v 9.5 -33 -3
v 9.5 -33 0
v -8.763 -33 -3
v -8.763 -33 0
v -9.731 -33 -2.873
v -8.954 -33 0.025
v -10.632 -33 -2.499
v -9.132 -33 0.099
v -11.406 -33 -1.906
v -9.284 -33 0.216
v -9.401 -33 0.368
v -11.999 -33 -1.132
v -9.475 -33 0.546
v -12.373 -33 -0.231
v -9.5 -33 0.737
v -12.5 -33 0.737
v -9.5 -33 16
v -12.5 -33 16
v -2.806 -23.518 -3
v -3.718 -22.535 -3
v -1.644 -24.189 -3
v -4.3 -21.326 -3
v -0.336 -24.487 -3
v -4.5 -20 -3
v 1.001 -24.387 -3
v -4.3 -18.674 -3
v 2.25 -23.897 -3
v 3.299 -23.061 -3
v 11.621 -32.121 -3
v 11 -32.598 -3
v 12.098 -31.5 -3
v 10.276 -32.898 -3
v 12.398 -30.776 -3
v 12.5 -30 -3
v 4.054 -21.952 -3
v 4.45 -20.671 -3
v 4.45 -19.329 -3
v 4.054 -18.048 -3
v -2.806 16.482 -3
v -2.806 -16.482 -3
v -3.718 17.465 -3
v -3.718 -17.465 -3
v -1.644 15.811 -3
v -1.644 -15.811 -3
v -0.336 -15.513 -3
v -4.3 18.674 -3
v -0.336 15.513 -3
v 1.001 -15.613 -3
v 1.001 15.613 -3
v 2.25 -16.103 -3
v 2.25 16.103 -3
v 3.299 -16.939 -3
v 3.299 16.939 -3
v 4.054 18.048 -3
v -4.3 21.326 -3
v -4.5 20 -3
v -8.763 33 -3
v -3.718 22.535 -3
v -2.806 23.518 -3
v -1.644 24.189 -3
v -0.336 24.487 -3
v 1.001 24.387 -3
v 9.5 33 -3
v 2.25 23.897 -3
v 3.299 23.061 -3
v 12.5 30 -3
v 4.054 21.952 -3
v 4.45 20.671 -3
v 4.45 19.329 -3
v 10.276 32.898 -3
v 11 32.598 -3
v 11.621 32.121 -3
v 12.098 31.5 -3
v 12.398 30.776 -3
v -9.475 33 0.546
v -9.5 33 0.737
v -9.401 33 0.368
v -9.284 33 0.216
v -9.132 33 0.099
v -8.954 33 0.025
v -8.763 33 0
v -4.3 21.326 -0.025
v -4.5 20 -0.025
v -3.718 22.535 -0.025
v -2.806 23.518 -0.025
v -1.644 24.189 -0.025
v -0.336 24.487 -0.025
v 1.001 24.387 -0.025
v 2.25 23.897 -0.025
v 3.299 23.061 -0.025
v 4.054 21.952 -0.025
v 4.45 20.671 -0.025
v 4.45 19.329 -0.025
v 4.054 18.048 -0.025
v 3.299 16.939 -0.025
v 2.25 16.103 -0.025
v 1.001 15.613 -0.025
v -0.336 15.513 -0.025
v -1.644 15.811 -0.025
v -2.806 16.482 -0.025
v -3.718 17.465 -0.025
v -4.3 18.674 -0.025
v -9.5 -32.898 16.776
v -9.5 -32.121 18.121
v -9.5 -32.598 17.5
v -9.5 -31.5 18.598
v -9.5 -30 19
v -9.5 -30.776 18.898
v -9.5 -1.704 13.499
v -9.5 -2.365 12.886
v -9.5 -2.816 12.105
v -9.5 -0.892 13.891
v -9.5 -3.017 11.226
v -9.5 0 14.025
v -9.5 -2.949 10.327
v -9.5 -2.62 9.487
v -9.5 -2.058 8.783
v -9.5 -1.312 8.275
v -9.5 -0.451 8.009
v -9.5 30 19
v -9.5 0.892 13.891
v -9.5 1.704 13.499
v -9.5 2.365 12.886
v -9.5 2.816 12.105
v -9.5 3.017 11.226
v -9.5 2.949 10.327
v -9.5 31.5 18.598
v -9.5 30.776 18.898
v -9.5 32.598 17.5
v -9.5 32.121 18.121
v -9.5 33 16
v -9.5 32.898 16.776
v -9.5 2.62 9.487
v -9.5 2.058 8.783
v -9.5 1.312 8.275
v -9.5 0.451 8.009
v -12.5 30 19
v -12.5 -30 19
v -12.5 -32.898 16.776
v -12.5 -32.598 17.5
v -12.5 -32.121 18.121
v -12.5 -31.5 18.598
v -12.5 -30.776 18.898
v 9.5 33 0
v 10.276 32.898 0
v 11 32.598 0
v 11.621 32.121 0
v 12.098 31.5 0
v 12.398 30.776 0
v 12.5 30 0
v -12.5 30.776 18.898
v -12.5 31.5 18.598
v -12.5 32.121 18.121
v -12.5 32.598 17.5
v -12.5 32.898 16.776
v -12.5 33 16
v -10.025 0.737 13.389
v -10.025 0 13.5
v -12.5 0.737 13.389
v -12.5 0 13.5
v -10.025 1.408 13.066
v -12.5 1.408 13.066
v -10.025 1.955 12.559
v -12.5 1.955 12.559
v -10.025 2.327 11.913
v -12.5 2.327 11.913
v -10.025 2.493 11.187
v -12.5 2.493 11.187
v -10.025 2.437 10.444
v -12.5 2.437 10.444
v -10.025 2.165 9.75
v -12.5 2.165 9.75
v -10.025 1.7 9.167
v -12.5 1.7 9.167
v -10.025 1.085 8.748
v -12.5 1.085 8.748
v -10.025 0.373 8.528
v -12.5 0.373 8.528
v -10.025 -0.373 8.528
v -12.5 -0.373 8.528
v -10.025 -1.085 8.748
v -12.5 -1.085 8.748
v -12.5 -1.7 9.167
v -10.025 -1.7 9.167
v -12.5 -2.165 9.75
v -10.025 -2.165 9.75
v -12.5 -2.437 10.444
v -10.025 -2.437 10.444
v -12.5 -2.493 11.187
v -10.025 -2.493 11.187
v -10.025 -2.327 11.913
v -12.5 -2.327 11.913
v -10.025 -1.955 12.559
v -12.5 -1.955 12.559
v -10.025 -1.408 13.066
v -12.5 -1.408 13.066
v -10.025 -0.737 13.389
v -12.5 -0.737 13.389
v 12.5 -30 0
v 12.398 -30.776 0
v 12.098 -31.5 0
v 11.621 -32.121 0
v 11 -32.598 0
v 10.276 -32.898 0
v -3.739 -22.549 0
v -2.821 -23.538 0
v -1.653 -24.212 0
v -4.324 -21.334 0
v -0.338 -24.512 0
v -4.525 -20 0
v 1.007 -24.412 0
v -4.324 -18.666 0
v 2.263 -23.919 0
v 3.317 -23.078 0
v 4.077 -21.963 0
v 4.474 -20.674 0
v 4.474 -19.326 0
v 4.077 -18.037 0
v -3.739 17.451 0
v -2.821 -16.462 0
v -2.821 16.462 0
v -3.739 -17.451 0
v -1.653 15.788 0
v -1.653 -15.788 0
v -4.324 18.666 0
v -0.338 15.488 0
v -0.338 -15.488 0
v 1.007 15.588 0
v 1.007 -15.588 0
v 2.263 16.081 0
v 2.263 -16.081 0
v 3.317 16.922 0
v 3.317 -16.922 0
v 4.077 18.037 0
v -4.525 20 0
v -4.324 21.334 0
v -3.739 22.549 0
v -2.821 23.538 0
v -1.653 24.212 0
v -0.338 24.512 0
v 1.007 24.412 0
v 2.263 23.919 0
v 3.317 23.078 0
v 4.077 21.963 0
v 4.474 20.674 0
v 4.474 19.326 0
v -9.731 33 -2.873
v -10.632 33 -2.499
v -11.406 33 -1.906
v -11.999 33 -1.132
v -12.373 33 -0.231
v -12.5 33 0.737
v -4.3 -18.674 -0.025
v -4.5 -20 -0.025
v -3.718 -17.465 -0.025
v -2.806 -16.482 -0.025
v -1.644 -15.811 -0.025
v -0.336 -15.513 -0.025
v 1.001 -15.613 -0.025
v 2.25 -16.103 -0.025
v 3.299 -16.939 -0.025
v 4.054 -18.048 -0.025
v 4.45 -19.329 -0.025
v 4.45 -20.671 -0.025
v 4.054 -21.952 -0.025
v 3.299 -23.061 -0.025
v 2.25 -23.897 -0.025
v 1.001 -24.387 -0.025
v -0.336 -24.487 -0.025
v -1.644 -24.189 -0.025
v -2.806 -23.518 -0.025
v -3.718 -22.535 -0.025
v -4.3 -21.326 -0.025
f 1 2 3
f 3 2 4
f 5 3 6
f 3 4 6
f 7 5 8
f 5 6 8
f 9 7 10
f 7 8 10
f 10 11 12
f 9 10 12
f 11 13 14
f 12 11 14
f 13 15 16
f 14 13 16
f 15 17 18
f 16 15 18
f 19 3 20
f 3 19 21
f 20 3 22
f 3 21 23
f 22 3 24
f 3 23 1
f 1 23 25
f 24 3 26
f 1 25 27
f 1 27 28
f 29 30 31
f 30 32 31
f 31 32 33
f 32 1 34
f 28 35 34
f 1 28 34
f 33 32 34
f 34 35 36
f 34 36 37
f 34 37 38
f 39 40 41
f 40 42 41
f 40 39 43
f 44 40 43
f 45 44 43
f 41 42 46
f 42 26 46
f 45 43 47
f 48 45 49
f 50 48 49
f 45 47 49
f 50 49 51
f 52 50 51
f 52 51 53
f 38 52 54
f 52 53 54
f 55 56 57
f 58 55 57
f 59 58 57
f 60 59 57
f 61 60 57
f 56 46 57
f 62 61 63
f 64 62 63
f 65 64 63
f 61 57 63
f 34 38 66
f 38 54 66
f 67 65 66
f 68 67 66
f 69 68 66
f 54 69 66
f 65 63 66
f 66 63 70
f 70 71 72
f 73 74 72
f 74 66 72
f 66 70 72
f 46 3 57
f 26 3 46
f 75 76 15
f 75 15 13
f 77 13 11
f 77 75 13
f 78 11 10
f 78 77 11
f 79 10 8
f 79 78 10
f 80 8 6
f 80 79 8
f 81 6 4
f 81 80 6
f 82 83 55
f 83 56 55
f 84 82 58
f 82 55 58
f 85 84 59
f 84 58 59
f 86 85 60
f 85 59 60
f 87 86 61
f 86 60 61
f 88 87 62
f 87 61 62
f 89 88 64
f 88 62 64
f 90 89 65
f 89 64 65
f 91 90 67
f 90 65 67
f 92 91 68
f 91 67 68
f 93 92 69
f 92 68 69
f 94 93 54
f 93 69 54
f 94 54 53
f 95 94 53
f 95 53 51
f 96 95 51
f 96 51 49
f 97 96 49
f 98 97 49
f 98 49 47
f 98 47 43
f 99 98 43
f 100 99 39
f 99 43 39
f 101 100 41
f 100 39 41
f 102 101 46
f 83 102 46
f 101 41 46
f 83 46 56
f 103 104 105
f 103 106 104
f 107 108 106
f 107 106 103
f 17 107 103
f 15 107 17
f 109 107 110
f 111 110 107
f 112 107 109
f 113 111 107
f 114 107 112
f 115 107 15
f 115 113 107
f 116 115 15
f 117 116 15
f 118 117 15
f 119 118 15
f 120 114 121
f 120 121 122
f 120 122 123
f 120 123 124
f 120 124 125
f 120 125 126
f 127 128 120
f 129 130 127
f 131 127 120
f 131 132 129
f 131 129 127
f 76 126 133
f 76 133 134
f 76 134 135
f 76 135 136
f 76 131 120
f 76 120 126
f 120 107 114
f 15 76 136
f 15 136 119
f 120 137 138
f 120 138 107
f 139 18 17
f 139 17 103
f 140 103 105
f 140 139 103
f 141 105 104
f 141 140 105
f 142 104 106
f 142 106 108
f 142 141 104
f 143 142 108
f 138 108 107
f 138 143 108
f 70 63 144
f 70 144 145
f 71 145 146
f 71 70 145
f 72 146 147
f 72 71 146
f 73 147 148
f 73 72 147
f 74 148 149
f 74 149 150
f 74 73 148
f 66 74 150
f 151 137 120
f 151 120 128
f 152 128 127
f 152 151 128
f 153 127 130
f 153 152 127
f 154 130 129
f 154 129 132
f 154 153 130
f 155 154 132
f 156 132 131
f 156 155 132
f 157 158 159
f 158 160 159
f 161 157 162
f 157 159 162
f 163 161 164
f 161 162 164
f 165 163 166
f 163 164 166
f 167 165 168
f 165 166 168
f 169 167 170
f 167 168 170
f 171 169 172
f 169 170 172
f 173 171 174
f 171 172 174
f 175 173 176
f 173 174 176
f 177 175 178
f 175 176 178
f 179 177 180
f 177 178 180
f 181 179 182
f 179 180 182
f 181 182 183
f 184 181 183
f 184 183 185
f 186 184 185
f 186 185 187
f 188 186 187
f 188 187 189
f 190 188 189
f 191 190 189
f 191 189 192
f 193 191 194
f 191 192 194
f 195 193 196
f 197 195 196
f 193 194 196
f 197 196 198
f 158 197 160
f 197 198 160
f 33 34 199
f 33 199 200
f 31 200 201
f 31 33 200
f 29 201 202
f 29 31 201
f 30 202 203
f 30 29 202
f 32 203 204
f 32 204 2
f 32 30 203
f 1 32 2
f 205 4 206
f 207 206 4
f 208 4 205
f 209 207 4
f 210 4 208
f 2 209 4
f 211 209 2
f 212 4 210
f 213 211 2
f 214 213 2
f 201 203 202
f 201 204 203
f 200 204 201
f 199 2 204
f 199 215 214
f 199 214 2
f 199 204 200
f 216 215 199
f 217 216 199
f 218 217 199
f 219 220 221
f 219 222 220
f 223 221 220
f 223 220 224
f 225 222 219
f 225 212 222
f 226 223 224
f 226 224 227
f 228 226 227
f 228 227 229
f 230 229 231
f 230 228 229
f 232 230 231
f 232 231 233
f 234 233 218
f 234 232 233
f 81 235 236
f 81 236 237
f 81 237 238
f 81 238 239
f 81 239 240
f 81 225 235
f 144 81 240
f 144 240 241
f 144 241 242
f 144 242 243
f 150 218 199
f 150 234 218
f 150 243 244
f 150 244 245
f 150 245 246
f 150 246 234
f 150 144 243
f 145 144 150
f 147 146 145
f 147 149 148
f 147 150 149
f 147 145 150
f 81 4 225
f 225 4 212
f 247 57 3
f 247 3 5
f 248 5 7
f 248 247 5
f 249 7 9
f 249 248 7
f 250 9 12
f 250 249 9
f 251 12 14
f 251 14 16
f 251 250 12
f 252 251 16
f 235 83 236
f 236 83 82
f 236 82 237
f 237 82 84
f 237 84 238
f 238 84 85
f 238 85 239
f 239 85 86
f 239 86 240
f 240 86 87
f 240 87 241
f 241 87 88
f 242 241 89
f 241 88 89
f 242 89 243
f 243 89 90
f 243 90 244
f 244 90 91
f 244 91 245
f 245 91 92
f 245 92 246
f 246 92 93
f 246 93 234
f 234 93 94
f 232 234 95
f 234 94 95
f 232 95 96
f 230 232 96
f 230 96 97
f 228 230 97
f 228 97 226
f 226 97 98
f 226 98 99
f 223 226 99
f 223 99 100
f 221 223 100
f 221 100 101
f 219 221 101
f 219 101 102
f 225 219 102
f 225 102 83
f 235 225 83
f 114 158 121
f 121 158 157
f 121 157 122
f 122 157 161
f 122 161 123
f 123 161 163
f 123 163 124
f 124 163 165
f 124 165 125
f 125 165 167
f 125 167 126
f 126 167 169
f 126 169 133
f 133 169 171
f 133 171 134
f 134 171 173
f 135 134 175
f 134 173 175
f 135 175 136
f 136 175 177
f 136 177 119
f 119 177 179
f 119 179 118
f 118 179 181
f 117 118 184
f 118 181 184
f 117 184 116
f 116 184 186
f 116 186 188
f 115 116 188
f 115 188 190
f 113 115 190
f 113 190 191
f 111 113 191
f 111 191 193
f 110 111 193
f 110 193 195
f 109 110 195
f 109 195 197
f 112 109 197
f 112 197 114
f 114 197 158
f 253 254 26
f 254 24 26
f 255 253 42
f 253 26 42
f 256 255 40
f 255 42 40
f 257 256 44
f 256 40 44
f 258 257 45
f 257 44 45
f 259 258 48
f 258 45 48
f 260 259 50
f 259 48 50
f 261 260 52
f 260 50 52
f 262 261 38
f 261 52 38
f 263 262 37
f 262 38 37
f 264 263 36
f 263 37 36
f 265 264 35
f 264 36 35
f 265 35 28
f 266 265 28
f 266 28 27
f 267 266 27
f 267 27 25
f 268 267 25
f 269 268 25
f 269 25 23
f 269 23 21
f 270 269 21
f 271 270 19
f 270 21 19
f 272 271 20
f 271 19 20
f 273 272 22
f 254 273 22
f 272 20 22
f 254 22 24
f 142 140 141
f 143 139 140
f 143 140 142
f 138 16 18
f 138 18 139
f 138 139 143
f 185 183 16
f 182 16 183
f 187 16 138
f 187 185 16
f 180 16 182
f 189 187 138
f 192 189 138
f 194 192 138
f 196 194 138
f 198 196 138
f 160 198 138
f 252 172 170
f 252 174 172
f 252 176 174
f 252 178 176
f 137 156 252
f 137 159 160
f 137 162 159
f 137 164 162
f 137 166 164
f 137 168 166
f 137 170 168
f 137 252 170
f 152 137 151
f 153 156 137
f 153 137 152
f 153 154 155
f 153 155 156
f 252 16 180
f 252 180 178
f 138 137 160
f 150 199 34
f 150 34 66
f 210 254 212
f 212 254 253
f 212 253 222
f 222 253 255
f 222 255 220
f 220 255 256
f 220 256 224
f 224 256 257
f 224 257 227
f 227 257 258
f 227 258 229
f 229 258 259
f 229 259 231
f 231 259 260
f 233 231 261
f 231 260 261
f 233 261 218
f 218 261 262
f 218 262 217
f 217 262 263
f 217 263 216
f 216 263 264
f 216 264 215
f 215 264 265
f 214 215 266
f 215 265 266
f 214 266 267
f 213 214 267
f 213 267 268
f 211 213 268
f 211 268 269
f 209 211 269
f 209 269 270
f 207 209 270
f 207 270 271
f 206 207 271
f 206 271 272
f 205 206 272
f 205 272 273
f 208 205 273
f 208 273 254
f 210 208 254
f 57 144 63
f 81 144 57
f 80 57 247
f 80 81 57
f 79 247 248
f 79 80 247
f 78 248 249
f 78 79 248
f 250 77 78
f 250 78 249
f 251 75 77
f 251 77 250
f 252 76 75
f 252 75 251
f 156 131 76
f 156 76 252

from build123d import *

# Parameters (mm, degrees)
SKETCH_1_W                       = 25
SKETCH_1_H                       = 66
SM_BASE_FLANGE_1_DEPTH           = 3
SM_EDGE_FLANGE_1_STRIP_W         = 13.4732
SM_EDGE_FLANGE_1_STRIP_H         = 3
SM_EDGE_FLANGE_1_STRIP_CUT_DEPTH = 66
SM_EDGE_FLANGE_1_DEPTH           = 66
OTHER_START                      = -12.5
OTHER_1_DEPTH                    = 3
OTHER_START_2                    = -3
OTHER_1_2_DEPTH                  = 3
HOLE_WIZARD_M8_2_D               = 9
HOLE_WIZARD_M8_2_DEPTH           = 24.5
HOLE_WIZARD_M8_2_CSINK_D         = 9.05
HOLE_WIZARD_M8_2_CSINK_ANGLE     = 90
HOLE_WIZARD_M8_2_TIP             = 2.703872786
HOLE_WIZARD_M6_1_D               = 5
HOLE_WIZARD_M6_1_DEPTH           = 15
HOLE_WIZARD_M6_1_CSINK_D         = 6.05
HOLE_WIZARD_M6_1_CSINK_ANGLE     = 90
HOLE_WIZARD_M6_1_TIP             = 1.502151548


# Read off the part's stored shape, not the designer's step: 断开-边角1
# Sheet-metal steps are written as plain solids
with BuildPart() as part:
    # Sketch 1 → 基体-法兰1 (new body)
    with BuildSketch(Plane.XY):
        Rectangle(SKETCH_1_W, SKETCH_1_H)
    extrude(amount=-SM_BASE_FLANGE_1_DEPTH)

    # 边线-法兰1 strip (across the edge) → 边线-法兰1 strip cut (cut)
    with BuildSketch(Plane(origin=(-12.5, 33, 0), x_dir=(1, 0, 0), z_dir=(0, -1, 0))):
        with Locations((-3, -1.5)):
            Rectangle(SM_EDGE_FLANGE_1_STRIP_W, SM_EDGE_FLANGE_1_STRIP_H)
    extrude(amount=SM_EDGE_FLANGE_1_STRIP_CUT_DEPTH, mode=Mode.SUBTRACT)

    # 边线-法兰1 section (across the edge) → 边线-法兰1 (add)
    with BuildSketch(Plane(origin=(-12.5, 33, 0), x_dir=(1, 0, 0), z_dir=(0, -1, 0))):
        with BuildLine():
            Line((0, 0.7366), (0, 19))
            Line((0, 19), (3, 19))
            Line((3, 19), (3, 0.7366))
            ThreePointArc((3, 0.7366), (3.215745145, 0.215745145), (3.7366, 0))
            Line((3.7366, 0), (3.7366, -3))
            ThreePointArc((3.7366, -3), (1.094424801, -1.905575199), (0, 0.7366))
        make_face()
    extrude(amount=SM_EDGE_FLANGE_1_DEPTH)

    # Other 1 outline → Other 1 (cut)
    with BuildSketch(Plane.YZ.offset(OTHER_START)):
        with BuildLine():
            ThreePointArc((-33, 16), (-32.121320344, 18.121320344), (-30, 19))
            Line((-30, 19), (-33, 19))
            Line((-33, 19), (-33, 16))
        make_face()
        with BuildLine():
            ThreePointArc((30, 19), (32.121320344, 18.121320344), (33, 16))
            Line((33, 16), (33, 19))
            Line((33, 19), (30, 19))
        make_face()
    extrude(amount=OTHER_1_DEPTH, mode=Mode.SUBTRACT)

    # Other 1 2 outline → Other 1 2 (cut)
    with BuildSketch(Plane.XY.offset(OTHER_START_2)):
        with BuildLine():
            ThreePointArc((9.5, 33), (11.621320344, 32.121320344), (12.5, 30))
            Line((12.5, 30), (12.5, 33))
            Line((12.5, 33), (9.5, 33))
        make_face()
        with BuildLine():
            ThreePointArc((12.5, -30), (11.621320344, -32.121320344), (9.5, -33))
            Line((9.5, -33), (12.5, -33))
            Line((12.5, -33), (12.5, -30))
        make_face()
    extrude(amount=OTHER_1_2_DEPTH, mode=Mode.SUBTRACT)

    # M8 间隙孔2
    with Locations(Plane.XY):
        with Locations((0, 20), (0, -20)):
            CounterSinkHole(HOLE_WIZARD_M8_2_D / 2, HOLE_WIZARD_M8_2_CSINK_D / 2, depth=HOLE_WIZARD_M8_2_DEPTH, counter_sink_angle=HOLE_WIZARD_M8_2_CSINK_ANGLE)
            with Locations((0, 0, -(HOLE_WIZARD_M8_2_DEPTH + HOLE_WIZARD_M8_2_TIP / 2))):  # 118° drill point
                Cone(0, HOLE_WIZARD_M8_2_D / 2, HOLE_WIZARD_M8_2_TIP, mode=Mode.SUBTRACT)

    # M6 螺纹孔1
    with Locations(Plane(origin=(-9.5, 0, 0), x_dir=(0, 0, -1), z_dir=(1, 0, 0))):
        with Locations((-11, 0)):
            CounterSinkHole(HOLE_WIZARD_M6_1_D / 2, HOLE_WIZARD_M6_1_CSINK_D / 2, depth=HOLE_WIZARD_M6_1_DEPTH, counter_sink_angle=HOLE_WIZARD_M6_1_CSINK_ANGLE)
            with Locations((0, 0, -(HOLE_WIZARD_M6_1_DEPTH + HOLE_WIZARD_M6_1_TIP / 2))):  # 118° drill point
                Cone(0, HOLE_WIZARD_M6_1_D / 2, HOLE_WIZARD_M6_1_TIP, mode=Mode.SUBTRACT)


solid = part.part
